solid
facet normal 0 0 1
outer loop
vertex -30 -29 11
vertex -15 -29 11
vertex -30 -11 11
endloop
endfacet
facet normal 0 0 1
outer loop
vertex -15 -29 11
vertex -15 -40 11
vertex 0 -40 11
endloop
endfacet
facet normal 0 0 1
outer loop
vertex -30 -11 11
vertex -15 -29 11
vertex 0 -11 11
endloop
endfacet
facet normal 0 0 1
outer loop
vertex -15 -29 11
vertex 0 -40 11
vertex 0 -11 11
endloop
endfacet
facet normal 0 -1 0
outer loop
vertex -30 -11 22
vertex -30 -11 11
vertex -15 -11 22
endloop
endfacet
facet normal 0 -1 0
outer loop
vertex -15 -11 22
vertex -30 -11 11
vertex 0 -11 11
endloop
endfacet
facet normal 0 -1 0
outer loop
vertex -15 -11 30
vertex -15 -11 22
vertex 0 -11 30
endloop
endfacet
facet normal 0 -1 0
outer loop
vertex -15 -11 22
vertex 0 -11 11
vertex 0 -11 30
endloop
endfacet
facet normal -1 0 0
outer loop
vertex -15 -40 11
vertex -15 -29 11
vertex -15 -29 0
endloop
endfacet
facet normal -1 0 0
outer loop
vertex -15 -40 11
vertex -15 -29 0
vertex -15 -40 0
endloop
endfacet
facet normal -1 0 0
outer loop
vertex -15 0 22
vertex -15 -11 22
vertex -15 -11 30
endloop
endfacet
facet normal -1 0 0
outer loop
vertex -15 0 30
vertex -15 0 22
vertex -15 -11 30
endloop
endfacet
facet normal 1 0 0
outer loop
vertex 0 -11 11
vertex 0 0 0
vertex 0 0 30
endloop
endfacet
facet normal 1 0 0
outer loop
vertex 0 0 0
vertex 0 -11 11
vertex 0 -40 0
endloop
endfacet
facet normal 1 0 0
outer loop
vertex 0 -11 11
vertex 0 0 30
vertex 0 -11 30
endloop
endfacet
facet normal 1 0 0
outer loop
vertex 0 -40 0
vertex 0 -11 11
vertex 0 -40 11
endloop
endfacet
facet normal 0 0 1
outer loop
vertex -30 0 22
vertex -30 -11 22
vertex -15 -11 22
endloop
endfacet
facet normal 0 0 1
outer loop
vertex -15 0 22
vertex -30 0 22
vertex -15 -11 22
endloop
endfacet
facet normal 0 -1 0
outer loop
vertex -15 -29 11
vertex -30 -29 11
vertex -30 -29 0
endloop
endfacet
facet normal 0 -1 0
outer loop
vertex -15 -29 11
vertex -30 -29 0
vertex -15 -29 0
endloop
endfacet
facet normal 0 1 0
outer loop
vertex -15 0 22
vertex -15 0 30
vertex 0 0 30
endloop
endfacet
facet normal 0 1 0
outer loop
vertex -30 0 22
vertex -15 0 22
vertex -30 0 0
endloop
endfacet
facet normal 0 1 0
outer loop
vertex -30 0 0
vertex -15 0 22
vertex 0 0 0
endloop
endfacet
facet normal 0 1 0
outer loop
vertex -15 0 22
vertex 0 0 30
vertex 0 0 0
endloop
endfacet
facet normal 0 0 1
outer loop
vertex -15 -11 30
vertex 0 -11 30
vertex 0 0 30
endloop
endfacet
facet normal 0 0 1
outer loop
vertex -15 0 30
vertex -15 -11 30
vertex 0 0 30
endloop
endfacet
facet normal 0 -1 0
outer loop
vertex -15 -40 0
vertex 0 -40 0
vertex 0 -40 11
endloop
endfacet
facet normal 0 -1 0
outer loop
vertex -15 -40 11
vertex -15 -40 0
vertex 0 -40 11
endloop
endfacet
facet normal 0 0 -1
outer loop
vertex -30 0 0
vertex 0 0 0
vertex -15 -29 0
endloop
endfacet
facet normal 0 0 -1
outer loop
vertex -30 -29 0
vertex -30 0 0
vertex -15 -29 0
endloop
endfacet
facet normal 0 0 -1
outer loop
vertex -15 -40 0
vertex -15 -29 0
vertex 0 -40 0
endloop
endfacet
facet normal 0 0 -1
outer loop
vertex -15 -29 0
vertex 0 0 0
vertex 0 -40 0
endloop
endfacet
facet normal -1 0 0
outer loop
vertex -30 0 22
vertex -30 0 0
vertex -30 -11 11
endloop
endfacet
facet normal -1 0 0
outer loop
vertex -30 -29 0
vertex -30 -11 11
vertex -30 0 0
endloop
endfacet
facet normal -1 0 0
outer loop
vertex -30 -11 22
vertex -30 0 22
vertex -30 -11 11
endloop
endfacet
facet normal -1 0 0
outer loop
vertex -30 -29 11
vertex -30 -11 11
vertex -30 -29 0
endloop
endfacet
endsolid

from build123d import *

# Parameters (mm, degrees)
F1_DEPTH = 30
F2_W     = 11
F2_H     = 15
F3_DEPTH = 11
F4_W     = 15
F4_H     = 8
F5_DEPTH = 11
F6_ANGLE = -90


with BuildPart() as f1:
    # F0 (on Front) → F1 (new body)
    with BuildSketch(Plane.XZ):
        Polygon((0, 30), (0, 0), (40, 0), (40, 11), (11, 11), (11, 30), align=None)
    extrude(amount=F1_DEPTH)

    # F2 (on face) → F3 (cut, through all)
    with BuildSketch(Plane.XY.offset(11)):
        with Locations((34.5, -22.5)):
            Rectangle(F2_W, F2_H)
    extrude(amount=-F3_DEPTH, mode=Mode.SUBTRACT)

    # F4 (on face) → F5 (cut, through all)
    with BuildSketch(Plane.YZ.offset(11)):
        with Locations((-22.5, 26)):
            Rectangle(F4_W, F4_H)
    extrude(amount=-F5_DEPTH, mode=Mode.SUBTRACT)


with BuildPart() as f1_1:
    # F6: moved
    add(f1.part.rotate(Axis((0, 0, 15), (0, 0, 1)), F6_ANGLE))


solid = f1_1.part
